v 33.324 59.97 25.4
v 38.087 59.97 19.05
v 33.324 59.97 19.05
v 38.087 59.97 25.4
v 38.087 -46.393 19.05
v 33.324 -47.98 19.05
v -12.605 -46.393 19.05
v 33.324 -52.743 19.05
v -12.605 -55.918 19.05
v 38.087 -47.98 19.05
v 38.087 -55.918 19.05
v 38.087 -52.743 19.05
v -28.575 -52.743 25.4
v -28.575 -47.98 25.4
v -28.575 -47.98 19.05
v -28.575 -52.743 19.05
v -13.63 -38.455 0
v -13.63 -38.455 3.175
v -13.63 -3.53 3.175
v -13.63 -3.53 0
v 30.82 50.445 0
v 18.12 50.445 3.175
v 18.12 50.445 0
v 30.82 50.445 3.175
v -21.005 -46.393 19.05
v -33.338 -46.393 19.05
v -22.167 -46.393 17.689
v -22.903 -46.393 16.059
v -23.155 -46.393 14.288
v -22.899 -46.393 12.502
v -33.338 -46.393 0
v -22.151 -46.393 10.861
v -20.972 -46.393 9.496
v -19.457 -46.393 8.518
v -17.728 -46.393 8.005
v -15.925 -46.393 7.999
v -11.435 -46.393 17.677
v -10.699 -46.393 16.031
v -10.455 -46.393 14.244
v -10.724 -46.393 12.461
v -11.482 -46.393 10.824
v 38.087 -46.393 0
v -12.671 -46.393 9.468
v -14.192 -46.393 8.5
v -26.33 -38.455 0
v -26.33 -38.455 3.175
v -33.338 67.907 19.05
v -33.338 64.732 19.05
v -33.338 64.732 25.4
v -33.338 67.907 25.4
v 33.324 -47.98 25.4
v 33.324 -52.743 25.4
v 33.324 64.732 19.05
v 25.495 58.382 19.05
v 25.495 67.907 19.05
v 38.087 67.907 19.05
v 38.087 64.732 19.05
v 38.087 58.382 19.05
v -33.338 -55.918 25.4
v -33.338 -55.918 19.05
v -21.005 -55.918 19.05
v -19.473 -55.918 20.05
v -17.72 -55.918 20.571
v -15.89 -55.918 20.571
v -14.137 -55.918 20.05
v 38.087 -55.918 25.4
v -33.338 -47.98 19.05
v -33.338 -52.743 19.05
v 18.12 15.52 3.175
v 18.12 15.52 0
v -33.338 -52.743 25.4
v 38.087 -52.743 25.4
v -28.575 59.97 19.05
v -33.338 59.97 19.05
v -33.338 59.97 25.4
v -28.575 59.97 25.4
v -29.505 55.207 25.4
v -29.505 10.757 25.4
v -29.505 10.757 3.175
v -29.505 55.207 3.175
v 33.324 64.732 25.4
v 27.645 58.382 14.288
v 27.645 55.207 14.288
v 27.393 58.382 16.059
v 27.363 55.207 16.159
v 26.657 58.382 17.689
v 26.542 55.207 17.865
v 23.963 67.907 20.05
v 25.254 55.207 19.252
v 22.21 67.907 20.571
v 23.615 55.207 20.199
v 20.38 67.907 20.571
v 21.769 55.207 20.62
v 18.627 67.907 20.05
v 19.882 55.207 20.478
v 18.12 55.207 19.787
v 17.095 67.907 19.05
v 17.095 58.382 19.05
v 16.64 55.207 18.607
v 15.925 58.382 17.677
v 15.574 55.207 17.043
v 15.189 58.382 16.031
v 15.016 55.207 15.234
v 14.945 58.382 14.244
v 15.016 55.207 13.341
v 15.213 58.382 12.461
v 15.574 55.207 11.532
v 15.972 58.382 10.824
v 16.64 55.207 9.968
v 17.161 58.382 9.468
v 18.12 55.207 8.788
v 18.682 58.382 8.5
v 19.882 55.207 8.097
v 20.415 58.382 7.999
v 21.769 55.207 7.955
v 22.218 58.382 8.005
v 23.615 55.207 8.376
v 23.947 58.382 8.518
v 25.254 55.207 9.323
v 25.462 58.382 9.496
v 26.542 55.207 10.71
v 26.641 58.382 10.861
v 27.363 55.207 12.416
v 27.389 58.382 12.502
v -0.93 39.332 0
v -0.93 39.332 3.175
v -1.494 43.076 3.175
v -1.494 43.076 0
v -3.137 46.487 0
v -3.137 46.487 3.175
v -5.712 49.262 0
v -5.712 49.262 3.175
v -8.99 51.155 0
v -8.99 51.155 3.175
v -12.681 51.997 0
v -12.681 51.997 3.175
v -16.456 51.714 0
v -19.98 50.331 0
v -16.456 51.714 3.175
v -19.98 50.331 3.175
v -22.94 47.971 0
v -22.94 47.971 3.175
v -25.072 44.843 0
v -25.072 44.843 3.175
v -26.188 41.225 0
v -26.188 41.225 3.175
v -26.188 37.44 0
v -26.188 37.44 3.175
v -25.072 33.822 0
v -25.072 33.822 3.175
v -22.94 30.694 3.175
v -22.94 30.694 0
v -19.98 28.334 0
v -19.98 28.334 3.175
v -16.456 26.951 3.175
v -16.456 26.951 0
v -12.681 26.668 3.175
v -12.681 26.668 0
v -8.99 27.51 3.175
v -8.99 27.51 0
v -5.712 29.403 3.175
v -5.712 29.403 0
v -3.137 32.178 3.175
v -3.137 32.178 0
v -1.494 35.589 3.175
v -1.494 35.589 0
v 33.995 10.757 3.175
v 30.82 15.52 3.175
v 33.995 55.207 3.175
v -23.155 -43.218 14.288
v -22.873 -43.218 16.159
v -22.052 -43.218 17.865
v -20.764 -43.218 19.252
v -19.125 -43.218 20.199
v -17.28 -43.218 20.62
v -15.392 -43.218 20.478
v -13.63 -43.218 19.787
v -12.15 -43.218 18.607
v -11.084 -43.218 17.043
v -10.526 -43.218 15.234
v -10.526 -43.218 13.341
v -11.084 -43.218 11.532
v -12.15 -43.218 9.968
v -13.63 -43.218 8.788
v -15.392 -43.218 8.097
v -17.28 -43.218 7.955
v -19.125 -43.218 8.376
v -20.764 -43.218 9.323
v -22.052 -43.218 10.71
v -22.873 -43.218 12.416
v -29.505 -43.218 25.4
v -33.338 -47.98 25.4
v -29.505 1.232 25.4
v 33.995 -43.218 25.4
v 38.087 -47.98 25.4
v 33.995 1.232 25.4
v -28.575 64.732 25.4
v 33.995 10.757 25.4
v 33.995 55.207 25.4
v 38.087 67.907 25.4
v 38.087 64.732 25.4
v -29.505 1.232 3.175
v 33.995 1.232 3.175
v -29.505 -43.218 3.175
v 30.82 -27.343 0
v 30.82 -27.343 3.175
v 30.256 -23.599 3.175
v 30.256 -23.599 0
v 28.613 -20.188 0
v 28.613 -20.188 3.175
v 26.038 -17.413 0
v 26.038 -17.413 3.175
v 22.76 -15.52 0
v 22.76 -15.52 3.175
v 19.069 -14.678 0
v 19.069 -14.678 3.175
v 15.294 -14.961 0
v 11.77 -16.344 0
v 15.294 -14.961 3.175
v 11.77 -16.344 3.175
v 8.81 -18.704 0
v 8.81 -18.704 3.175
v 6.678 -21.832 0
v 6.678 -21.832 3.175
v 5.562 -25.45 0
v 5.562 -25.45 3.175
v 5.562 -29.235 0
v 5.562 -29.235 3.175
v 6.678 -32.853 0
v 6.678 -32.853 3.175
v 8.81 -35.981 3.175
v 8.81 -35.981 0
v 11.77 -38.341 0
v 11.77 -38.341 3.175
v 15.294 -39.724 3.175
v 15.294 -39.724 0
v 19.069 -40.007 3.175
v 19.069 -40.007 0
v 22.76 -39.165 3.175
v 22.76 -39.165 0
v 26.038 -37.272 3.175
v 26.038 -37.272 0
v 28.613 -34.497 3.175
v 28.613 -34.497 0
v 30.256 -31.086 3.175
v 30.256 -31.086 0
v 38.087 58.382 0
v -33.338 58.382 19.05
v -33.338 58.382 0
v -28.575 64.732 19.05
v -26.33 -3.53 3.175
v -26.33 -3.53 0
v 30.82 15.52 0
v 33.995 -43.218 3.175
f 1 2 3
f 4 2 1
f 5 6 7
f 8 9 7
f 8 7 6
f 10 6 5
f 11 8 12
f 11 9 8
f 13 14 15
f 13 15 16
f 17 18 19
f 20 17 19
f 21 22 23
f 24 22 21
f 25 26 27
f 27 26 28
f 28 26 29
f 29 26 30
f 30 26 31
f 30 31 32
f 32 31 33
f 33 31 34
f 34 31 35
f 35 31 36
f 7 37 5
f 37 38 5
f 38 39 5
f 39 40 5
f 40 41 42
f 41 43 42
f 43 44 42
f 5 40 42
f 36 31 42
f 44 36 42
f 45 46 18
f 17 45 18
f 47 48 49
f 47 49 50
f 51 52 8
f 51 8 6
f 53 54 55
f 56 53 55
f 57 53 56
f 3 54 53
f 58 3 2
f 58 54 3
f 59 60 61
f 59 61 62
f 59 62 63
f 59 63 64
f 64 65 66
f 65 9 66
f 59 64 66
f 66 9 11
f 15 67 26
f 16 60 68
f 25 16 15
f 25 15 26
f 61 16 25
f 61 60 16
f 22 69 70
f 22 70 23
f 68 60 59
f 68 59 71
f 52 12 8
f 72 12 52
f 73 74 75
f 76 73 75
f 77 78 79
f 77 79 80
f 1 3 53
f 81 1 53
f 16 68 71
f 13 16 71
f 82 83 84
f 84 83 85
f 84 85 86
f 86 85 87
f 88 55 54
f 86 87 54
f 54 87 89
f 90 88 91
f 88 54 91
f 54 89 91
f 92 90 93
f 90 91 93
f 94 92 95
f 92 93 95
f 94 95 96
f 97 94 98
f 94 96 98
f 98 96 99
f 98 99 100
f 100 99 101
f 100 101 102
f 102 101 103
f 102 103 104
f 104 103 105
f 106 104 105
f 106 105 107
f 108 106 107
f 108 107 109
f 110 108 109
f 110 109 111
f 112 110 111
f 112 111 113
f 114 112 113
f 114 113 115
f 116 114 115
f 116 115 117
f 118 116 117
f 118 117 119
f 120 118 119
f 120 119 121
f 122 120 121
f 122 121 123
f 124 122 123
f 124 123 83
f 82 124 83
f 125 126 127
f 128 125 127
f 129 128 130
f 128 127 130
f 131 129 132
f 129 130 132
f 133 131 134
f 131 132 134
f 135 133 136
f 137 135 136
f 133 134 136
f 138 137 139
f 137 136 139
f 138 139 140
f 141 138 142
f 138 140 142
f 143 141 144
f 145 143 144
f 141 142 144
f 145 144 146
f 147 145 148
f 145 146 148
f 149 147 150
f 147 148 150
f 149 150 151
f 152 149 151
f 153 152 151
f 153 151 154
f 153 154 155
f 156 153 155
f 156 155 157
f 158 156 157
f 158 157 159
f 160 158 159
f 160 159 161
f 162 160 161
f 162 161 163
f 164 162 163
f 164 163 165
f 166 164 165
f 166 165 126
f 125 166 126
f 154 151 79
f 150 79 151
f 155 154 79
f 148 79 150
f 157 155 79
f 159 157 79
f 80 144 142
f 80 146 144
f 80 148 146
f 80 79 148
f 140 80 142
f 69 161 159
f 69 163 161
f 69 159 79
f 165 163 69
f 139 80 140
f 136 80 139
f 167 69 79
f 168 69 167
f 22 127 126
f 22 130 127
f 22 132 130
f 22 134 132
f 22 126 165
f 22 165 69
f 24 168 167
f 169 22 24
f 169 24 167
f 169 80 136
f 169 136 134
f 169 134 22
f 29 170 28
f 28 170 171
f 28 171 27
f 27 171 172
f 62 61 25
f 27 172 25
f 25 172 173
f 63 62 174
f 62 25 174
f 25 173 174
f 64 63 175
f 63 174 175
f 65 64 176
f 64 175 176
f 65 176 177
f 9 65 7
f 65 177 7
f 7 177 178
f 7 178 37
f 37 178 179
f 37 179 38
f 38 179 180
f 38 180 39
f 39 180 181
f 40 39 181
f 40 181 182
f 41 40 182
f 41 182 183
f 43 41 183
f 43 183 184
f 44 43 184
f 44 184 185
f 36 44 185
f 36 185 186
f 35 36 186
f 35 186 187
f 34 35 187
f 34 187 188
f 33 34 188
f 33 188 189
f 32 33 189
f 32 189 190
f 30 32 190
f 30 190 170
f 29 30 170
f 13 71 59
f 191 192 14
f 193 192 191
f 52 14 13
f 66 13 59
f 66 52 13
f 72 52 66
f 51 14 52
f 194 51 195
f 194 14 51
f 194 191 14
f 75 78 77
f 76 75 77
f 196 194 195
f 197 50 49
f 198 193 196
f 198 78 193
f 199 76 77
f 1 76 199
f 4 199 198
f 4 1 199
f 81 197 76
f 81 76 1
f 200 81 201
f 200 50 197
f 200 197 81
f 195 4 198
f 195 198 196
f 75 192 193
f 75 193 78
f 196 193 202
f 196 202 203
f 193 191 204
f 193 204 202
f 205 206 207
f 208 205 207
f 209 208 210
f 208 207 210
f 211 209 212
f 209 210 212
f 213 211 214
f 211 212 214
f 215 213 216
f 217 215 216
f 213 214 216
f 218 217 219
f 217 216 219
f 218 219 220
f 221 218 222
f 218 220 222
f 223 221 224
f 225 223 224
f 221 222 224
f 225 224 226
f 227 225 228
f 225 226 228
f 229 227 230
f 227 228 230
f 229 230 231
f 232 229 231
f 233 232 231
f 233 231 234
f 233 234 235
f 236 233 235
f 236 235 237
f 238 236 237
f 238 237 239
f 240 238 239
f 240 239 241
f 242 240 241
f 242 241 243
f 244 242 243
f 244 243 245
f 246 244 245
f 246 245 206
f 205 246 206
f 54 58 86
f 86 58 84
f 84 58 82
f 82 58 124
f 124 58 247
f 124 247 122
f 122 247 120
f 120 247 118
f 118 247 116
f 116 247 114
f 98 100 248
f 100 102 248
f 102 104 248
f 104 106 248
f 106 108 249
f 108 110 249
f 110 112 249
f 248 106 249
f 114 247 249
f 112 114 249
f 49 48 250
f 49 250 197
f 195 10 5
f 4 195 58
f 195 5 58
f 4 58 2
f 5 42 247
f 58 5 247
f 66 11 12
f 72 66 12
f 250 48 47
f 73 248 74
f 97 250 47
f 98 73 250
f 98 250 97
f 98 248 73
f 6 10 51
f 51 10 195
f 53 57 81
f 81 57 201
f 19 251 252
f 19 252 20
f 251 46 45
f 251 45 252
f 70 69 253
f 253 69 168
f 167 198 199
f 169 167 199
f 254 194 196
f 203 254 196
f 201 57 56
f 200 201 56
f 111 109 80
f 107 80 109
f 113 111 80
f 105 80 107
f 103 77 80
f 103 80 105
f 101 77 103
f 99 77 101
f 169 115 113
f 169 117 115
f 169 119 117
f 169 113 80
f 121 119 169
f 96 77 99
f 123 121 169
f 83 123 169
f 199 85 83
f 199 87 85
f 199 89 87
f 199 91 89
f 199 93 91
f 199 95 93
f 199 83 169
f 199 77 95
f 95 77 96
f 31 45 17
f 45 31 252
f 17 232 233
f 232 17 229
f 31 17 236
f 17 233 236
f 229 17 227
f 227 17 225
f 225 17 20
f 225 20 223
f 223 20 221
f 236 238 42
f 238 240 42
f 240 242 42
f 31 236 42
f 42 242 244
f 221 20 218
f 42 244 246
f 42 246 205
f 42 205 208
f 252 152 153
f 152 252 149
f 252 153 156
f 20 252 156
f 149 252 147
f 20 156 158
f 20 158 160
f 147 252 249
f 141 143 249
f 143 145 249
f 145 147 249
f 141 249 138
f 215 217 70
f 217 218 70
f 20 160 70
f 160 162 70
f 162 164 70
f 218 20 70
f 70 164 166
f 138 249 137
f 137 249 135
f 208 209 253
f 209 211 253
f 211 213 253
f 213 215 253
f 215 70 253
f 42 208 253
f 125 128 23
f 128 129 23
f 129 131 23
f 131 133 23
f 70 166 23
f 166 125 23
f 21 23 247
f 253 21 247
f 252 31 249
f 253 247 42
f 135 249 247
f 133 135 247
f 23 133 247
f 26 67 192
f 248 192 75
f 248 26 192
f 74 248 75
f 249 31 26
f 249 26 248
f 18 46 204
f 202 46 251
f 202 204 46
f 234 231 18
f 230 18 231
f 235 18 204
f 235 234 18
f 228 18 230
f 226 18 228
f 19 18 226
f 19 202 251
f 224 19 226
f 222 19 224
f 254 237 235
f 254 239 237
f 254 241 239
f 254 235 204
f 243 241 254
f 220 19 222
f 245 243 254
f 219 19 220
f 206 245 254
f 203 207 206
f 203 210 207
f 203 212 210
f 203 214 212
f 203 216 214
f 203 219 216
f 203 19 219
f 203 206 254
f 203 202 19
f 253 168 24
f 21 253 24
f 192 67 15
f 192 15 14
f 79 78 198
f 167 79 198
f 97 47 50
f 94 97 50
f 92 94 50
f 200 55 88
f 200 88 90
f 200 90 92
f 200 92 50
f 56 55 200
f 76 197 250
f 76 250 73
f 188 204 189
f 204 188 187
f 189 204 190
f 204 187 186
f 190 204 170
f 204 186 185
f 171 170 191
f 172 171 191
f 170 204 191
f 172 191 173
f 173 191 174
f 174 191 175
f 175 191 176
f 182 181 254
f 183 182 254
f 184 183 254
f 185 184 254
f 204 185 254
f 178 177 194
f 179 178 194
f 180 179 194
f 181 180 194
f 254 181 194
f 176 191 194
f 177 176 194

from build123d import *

# Parameters (mm, degrees)
F0_W      = 71.4248
F0_H      = 123.825
F1_DEPTH  = 25.4
F2_W      = 63.5
F2_H      = 44.45
F3_DEPTH  = 22.225
F4_W      = 4.7625
F4_H      = 25.4
F5_DEPTH  = 4.7625
F6_W      = 4.7625
F6_H      = 25.4
F7_DEPTH  = 4.7625
F9_DEPTH  = 19.05
F11_DEPTH = 19.05
F12_R     = 12.7
F12_W     = 12.7
F12_H     = 34.925
F13_DEPTH = 6.35
F14_R     = 6.35
F15_DEPTH = 25.4
F16_R     = 6.35
F17_DEPTH = 25.4


with BuildPart() as f1:
    # F0 (on Top) → F1 (new body)
    with BuildSketch(Plane.XY):
        with Locations((2.37449, 5.994919)):
            Rectangle(F0_W, F0_H)
    extrude(amount=F1_DEPTH)

    # F2 (on face) → F3 (cut)
    with BuildSketch(Plane.XY.offset(25.4)):
        with Locations((2.24492, 32.982419)):
            Rectangle(F2_W, F2_H)
        with Locations((2.24492, -20.992581)):
            Rectangle(F2_W, F2_H)
    extrude(amount=-F3_DEPTH, mode=Mode.SUBTRACT)

    # F4 (on face) → F5 (cut)
    with BuildSketch(Plane.YZ.offset(38.08689)):
        with Locations((62.351169, 12.7)):
            Rectangle(F4_W, F4_H)
        with Locations((-50.361331, 12.7)):
            Rectangle(F4_W, F4_H)
    extrude(amount=-F5_DEPTH, mode=Mode.SUBTRACT)

    # F6 (on face) → F7 (cut)
    with BuildSketch(Plane(origin=(-33.33791, 0, 0), x_dir=(0, -1, 0), z_dir=(-1, 0, 0))):
        with Locations((-62.351169, 12.7)):
            Rectangle(F6_W, F6_H)
        with Locations((50.361331, 12.7)):
            Rectangle(F6_W, F6_H)
    extrude(amount=-F7_DEPTH, mode=Mode.SUBTRACT)

    # F8 (on face) → F9 (cut)
    with BuildSketch(Plane(origin=(0, 0, 0), x_dir=(1, 0, 0), z_dir=(0, 0, -1))):
        Polygon((-33.33791, -67.907419), (38.08689, -67.907419), (38.08689, -64.732419), (33.32439, -64.732419), (33.32439, -59.969919), (38.08689, -59.969919), (38.08689, -58.382419), (-33.33791, -58.382419), (-33.33791, -59.969919), (-28.57541, -59.969919), (-28.57541, -64.732419), (-33.33791, -64.732419), align=None)
    extrude(amount=-F9_DEPTH, mode=Mode.SUBTRACT)

    # F10 (on face) → F11 (cut)
    with BuildSketch(Plane(origin=(0, 0, 0), x_dir=(1, 0, 0), z_dir=(0, 0, -1))):
        Polygon((38.08689, 52.742581), (38.08689, 55.917581), (-33.33791, 55.917581), (-33.33791, 52.742581), (-28.57541, 52.742581), (-28.57541, 47.980081), (-33.33791, 47.980081), (-33.33791, 46.392581), (38.08689, 46.392581), (38.08689, 47.980081), (33.32439, 47.980081), (33.32439, 52.742581), align=None)
    extrude(amount=-F11_DEPTH, mode=Mode.SUBTRACT)

    # F12 (on face) → F13 (cut)
    with BuildSketch(Plane.XY.offset(3.175)):
        with Locations((-13.63008, 39.332419)):
            Circle(F12_R)
        with Locations((24.46992, 32.982419)):
            Rectangle(F12_W, F12_H)
        with Locations((-19.98008, -20.992581)):
            Rectangle(F12_W, F12_H)
        with Locations((18.11992, -27.342581)):
            Circle(F12_R)
    extrude(amount=-F13_DEPTH, mode=Mode.SUBTRACT)

    # F14 (on face) → F15 (cut)
    with BuildSketch(Plane.XZ.offset(-55.207419)):
        with Locations((21.29492, 14.2875)):
            Circle(F14_R)
    extrude(amount=-F15_DEPTH, mode=Mode.SUBTRACT)

    # F16 (on face) → F17 (cut)
    with BuildSketch(Plane(origin=(0, -43.217581, 0), x_dir=(-1, 0, 0), z_dir=(0, 1, 0))):
        with Locations((16.80508, 14.2875)):
            Circle(F16_R)
    extrude(amount=-F17_DEPTH, mode=Mode.SUBTRACT)


solid = f1.part
